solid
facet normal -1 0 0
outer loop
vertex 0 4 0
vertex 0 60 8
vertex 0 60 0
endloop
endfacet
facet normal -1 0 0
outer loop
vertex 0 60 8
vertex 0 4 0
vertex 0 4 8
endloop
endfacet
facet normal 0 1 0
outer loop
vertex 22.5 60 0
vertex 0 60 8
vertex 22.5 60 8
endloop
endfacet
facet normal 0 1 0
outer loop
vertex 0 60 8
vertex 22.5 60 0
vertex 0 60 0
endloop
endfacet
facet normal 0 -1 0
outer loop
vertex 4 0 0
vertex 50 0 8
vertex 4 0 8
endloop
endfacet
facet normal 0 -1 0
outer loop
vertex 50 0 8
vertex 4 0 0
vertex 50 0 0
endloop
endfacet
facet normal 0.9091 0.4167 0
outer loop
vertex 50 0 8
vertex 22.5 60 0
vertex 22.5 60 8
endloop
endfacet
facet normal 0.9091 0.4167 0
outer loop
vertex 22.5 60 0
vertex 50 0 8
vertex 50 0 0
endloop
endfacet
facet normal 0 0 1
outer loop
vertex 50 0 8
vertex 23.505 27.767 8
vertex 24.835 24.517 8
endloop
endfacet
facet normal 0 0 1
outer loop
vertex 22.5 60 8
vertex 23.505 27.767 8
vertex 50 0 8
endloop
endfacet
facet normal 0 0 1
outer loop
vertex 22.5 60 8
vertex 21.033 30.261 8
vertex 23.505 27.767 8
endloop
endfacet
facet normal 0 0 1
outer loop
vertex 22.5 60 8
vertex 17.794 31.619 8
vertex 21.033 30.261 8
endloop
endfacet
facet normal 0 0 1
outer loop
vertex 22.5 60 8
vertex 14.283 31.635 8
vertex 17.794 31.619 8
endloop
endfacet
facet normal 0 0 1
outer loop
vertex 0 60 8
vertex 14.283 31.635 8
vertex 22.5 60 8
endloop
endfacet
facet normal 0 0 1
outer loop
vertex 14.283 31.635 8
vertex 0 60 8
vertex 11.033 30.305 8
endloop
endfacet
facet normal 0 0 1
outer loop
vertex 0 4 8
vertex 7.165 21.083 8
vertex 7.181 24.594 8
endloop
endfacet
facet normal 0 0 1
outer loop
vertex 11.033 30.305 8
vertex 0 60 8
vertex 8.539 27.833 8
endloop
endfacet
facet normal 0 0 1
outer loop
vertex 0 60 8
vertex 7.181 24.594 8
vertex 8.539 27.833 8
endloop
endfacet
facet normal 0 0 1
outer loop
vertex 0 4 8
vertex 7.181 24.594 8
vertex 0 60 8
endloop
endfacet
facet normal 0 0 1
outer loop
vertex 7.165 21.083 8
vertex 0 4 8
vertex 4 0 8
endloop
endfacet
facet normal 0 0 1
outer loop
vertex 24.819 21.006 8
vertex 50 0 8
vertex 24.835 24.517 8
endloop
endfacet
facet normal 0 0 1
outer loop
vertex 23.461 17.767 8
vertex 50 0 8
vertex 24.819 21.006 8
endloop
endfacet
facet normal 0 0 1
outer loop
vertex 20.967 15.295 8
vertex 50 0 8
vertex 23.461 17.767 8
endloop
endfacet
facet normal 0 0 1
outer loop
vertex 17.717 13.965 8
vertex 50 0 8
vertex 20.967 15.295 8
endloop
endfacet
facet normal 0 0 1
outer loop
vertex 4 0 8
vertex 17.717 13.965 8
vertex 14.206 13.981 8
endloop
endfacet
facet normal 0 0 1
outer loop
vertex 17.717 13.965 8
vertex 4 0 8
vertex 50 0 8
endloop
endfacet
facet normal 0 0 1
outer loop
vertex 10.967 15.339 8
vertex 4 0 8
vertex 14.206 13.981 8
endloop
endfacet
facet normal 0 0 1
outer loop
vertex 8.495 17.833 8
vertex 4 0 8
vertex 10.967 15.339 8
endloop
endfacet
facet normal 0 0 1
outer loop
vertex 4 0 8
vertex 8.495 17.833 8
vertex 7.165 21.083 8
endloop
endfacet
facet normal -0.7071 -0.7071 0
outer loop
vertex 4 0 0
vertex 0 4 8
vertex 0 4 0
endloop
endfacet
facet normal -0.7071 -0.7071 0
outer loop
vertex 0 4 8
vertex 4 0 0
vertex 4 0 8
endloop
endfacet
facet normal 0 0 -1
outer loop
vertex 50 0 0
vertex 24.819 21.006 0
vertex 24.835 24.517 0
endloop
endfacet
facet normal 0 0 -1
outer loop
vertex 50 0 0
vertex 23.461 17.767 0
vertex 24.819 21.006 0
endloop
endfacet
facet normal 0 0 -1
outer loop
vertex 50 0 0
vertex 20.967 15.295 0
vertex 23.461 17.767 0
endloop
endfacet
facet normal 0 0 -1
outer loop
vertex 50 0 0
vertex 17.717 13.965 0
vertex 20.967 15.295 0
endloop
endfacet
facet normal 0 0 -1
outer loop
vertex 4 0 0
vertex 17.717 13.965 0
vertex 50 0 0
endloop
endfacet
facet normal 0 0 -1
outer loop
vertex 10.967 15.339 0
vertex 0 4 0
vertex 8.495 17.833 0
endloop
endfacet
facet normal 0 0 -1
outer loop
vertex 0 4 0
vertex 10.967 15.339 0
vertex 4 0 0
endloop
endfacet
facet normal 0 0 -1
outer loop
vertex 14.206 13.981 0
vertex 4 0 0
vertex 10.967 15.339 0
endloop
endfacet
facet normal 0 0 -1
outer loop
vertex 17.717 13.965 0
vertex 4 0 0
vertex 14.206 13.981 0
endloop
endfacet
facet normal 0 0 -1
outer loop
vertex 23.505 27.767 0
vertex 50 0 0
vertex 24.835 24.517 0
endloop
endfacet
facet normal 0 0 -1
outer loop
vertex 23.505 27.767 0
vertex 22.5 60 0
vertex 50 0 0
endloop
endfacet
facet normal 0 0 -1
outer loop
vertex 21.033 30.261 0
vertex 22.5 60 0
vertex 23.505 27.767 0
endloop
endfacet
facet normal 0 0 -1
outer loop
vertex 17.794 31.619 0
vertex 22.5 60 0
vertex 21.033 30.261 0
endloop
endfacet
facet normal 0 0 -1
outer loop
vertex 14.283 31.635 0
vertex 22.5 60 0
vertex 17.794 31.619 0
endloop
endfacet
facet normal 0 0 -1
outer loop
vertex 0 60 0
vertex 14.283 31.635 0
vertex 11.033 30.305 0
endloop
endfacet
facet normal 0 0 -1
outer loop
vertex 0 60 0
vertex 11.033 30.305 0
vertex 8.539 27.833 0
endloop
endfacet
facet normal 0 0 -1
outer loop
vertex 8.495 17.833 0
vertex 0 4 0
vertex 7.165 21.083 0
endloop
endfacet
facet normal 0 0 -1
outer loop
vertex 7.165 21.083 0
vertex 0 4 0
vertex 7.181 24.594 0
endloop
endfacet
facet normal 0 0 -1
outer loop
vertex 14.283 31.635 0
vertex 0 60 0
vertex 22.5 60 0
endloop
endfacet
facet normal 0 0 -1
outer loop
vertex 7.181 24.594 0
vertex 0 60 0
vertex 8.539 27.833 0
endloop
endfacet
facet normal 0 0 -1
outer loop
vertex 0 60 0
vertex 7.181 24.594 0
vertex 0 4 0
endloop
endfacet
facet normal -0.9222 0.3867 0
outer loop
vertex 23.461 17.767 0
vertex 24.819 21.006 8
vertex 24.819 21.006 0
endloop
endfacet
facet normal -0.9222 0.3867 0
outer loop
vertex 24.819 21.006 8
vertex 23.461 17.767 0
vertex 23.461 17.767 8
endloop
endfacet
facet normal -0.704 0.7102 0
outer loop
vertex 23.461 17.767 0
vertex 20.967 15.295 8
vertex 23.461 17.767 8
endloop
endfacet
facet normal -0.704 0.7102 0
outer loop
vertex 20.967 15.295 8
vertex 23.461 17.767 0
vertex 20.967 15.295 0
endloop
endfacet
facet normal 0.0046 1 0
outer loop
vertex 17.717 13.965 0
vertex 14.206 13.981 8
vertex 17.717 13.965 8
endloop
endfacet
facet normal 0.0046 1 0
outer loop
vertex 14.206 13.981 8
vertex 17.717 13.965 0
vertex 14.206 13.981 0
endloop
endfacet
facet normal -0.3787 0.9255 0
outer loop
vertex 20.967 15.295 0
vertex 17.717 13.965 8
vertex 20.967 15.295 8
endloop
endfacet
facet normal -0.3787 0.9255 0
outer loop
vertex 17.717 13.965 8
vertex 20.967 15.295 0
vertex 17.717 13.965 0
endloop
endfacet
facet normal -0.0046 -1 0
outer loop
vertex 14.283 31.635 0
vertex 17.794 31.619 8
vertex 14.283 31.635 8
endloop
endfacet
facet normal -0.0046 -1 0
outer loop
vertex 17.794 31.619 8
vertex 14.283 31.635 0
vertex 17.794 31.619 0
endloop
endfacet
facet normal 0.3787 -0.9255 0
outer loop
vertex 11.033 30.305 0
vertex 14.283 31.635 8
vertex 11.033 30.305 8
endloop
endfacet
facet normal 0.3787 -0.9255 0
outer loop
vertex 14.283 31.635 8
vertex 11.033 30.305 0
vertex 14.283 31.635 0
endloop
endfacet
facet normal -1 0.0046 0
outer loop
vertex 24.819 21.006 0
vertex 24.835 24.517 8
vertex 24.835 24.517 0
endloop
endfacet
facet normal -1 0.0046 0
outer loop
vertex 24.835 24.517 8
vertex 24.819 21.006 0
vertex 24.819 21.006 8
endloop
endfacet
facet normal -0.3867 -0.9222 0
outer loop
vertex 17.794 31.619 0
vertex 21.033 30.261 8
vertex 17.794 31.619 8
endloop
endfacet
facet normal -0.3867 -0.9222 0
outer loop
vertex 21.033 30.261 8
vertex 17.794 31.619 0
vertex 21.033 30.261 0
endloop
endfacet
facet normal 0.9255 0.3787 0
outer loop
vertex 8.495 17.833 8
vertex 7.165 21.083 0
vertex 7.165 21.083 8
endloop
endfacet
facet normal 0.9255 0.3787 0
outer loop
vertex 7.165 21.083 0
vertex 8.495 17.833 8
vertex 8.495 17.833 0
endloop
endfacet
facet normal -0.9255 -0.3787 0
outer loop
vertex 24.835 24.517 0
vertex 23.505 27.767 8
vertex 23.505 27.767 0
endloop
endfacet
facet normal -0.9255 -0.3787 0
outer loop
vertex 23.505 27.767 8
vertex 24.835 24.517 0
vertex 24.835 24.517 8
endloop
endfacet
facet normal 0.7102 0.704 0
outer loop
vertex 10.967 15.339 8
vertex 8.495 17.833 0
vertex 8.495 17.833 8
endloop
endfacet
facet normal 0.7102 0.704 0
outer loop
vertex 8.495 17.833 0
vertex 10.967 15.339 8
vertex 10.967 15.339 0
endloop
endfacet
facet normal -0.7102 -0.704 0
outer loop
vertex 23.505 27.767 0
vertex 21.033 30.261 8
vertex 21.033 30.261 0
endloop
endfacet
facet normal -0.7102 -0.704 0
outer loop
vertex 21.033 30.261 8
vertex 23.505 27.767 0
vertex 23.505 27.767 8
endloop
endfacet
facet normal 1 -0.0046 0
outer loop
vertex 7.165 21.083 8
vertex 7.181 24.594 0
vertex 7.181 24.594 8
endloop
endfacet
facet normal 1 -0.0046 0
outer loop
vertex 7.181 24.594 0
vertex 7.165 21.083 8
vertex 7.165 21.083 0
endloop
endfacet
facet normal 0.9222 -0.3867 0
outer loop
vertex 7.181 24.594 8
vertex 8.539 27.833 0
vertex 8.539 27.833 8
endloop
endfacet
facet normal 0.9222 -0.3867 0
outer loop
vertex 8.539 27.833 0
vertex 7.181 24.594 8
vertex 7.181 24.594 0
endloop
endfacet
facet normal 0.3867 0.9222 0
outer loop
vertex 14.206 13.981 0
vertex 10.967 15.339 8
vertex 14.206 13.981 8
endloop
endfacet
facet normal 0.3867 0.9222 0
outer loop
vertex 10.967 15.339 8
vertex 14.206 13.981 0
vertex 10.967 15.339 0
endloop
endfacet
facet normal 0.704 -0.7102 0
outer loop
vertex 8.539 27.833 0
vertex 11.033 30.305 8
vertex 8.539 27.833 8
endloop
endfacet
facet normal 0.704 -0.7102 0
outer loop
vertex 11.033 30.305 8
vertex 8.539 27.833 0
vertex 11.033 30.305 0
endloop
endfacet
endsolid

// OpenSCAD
$fn = 32;

// ----------------------------------------------------------------------
// Bracket plate: gusset 50 x 60
// ----------------------------------------------------------------------

// --- parameters (mm) ---
hole_r = 3.5;             // bolt hole radius
plate_t = 8;              // plate thickness, Z (extrusion height)
gus_a = 50;               // base length
gus_b = 60;               // height
top_x = 22.5;             // top edge X of the angled cut
light_r = 9;              // lightening hole radius

light_d = 2 * light_r;

profile = [[4, 0], [25, 0], [50, 0], [22.5, 60], [0, 60], [0, 4]];  // primary outline, 6 points, counter clockwise
void_1 = [[24.835, 24.517], [23.505, 27.767], [21.033, 30.261], [17.794, 31.619], [14.283, 31.635], [11.033, 30.305], [8.539, 27.833], [7.181, 24.594], [7.165, 21.083], [8.495, 17.833], [10.967, 15.339], [14.206, 13.981], [17.717, 13.965], [20.967, 15.295], [23.461, 17.767], [24.819, 21.006]];  // lightening hole, 16 points

// --- the one profile operation ---
difference() {
  linear_extrude(height = plate_t) polygon(points = profile);
  translate([0, 0, -1])
    linear_extrude(height = plate_t + 2) polygon(points = void_1);
}
